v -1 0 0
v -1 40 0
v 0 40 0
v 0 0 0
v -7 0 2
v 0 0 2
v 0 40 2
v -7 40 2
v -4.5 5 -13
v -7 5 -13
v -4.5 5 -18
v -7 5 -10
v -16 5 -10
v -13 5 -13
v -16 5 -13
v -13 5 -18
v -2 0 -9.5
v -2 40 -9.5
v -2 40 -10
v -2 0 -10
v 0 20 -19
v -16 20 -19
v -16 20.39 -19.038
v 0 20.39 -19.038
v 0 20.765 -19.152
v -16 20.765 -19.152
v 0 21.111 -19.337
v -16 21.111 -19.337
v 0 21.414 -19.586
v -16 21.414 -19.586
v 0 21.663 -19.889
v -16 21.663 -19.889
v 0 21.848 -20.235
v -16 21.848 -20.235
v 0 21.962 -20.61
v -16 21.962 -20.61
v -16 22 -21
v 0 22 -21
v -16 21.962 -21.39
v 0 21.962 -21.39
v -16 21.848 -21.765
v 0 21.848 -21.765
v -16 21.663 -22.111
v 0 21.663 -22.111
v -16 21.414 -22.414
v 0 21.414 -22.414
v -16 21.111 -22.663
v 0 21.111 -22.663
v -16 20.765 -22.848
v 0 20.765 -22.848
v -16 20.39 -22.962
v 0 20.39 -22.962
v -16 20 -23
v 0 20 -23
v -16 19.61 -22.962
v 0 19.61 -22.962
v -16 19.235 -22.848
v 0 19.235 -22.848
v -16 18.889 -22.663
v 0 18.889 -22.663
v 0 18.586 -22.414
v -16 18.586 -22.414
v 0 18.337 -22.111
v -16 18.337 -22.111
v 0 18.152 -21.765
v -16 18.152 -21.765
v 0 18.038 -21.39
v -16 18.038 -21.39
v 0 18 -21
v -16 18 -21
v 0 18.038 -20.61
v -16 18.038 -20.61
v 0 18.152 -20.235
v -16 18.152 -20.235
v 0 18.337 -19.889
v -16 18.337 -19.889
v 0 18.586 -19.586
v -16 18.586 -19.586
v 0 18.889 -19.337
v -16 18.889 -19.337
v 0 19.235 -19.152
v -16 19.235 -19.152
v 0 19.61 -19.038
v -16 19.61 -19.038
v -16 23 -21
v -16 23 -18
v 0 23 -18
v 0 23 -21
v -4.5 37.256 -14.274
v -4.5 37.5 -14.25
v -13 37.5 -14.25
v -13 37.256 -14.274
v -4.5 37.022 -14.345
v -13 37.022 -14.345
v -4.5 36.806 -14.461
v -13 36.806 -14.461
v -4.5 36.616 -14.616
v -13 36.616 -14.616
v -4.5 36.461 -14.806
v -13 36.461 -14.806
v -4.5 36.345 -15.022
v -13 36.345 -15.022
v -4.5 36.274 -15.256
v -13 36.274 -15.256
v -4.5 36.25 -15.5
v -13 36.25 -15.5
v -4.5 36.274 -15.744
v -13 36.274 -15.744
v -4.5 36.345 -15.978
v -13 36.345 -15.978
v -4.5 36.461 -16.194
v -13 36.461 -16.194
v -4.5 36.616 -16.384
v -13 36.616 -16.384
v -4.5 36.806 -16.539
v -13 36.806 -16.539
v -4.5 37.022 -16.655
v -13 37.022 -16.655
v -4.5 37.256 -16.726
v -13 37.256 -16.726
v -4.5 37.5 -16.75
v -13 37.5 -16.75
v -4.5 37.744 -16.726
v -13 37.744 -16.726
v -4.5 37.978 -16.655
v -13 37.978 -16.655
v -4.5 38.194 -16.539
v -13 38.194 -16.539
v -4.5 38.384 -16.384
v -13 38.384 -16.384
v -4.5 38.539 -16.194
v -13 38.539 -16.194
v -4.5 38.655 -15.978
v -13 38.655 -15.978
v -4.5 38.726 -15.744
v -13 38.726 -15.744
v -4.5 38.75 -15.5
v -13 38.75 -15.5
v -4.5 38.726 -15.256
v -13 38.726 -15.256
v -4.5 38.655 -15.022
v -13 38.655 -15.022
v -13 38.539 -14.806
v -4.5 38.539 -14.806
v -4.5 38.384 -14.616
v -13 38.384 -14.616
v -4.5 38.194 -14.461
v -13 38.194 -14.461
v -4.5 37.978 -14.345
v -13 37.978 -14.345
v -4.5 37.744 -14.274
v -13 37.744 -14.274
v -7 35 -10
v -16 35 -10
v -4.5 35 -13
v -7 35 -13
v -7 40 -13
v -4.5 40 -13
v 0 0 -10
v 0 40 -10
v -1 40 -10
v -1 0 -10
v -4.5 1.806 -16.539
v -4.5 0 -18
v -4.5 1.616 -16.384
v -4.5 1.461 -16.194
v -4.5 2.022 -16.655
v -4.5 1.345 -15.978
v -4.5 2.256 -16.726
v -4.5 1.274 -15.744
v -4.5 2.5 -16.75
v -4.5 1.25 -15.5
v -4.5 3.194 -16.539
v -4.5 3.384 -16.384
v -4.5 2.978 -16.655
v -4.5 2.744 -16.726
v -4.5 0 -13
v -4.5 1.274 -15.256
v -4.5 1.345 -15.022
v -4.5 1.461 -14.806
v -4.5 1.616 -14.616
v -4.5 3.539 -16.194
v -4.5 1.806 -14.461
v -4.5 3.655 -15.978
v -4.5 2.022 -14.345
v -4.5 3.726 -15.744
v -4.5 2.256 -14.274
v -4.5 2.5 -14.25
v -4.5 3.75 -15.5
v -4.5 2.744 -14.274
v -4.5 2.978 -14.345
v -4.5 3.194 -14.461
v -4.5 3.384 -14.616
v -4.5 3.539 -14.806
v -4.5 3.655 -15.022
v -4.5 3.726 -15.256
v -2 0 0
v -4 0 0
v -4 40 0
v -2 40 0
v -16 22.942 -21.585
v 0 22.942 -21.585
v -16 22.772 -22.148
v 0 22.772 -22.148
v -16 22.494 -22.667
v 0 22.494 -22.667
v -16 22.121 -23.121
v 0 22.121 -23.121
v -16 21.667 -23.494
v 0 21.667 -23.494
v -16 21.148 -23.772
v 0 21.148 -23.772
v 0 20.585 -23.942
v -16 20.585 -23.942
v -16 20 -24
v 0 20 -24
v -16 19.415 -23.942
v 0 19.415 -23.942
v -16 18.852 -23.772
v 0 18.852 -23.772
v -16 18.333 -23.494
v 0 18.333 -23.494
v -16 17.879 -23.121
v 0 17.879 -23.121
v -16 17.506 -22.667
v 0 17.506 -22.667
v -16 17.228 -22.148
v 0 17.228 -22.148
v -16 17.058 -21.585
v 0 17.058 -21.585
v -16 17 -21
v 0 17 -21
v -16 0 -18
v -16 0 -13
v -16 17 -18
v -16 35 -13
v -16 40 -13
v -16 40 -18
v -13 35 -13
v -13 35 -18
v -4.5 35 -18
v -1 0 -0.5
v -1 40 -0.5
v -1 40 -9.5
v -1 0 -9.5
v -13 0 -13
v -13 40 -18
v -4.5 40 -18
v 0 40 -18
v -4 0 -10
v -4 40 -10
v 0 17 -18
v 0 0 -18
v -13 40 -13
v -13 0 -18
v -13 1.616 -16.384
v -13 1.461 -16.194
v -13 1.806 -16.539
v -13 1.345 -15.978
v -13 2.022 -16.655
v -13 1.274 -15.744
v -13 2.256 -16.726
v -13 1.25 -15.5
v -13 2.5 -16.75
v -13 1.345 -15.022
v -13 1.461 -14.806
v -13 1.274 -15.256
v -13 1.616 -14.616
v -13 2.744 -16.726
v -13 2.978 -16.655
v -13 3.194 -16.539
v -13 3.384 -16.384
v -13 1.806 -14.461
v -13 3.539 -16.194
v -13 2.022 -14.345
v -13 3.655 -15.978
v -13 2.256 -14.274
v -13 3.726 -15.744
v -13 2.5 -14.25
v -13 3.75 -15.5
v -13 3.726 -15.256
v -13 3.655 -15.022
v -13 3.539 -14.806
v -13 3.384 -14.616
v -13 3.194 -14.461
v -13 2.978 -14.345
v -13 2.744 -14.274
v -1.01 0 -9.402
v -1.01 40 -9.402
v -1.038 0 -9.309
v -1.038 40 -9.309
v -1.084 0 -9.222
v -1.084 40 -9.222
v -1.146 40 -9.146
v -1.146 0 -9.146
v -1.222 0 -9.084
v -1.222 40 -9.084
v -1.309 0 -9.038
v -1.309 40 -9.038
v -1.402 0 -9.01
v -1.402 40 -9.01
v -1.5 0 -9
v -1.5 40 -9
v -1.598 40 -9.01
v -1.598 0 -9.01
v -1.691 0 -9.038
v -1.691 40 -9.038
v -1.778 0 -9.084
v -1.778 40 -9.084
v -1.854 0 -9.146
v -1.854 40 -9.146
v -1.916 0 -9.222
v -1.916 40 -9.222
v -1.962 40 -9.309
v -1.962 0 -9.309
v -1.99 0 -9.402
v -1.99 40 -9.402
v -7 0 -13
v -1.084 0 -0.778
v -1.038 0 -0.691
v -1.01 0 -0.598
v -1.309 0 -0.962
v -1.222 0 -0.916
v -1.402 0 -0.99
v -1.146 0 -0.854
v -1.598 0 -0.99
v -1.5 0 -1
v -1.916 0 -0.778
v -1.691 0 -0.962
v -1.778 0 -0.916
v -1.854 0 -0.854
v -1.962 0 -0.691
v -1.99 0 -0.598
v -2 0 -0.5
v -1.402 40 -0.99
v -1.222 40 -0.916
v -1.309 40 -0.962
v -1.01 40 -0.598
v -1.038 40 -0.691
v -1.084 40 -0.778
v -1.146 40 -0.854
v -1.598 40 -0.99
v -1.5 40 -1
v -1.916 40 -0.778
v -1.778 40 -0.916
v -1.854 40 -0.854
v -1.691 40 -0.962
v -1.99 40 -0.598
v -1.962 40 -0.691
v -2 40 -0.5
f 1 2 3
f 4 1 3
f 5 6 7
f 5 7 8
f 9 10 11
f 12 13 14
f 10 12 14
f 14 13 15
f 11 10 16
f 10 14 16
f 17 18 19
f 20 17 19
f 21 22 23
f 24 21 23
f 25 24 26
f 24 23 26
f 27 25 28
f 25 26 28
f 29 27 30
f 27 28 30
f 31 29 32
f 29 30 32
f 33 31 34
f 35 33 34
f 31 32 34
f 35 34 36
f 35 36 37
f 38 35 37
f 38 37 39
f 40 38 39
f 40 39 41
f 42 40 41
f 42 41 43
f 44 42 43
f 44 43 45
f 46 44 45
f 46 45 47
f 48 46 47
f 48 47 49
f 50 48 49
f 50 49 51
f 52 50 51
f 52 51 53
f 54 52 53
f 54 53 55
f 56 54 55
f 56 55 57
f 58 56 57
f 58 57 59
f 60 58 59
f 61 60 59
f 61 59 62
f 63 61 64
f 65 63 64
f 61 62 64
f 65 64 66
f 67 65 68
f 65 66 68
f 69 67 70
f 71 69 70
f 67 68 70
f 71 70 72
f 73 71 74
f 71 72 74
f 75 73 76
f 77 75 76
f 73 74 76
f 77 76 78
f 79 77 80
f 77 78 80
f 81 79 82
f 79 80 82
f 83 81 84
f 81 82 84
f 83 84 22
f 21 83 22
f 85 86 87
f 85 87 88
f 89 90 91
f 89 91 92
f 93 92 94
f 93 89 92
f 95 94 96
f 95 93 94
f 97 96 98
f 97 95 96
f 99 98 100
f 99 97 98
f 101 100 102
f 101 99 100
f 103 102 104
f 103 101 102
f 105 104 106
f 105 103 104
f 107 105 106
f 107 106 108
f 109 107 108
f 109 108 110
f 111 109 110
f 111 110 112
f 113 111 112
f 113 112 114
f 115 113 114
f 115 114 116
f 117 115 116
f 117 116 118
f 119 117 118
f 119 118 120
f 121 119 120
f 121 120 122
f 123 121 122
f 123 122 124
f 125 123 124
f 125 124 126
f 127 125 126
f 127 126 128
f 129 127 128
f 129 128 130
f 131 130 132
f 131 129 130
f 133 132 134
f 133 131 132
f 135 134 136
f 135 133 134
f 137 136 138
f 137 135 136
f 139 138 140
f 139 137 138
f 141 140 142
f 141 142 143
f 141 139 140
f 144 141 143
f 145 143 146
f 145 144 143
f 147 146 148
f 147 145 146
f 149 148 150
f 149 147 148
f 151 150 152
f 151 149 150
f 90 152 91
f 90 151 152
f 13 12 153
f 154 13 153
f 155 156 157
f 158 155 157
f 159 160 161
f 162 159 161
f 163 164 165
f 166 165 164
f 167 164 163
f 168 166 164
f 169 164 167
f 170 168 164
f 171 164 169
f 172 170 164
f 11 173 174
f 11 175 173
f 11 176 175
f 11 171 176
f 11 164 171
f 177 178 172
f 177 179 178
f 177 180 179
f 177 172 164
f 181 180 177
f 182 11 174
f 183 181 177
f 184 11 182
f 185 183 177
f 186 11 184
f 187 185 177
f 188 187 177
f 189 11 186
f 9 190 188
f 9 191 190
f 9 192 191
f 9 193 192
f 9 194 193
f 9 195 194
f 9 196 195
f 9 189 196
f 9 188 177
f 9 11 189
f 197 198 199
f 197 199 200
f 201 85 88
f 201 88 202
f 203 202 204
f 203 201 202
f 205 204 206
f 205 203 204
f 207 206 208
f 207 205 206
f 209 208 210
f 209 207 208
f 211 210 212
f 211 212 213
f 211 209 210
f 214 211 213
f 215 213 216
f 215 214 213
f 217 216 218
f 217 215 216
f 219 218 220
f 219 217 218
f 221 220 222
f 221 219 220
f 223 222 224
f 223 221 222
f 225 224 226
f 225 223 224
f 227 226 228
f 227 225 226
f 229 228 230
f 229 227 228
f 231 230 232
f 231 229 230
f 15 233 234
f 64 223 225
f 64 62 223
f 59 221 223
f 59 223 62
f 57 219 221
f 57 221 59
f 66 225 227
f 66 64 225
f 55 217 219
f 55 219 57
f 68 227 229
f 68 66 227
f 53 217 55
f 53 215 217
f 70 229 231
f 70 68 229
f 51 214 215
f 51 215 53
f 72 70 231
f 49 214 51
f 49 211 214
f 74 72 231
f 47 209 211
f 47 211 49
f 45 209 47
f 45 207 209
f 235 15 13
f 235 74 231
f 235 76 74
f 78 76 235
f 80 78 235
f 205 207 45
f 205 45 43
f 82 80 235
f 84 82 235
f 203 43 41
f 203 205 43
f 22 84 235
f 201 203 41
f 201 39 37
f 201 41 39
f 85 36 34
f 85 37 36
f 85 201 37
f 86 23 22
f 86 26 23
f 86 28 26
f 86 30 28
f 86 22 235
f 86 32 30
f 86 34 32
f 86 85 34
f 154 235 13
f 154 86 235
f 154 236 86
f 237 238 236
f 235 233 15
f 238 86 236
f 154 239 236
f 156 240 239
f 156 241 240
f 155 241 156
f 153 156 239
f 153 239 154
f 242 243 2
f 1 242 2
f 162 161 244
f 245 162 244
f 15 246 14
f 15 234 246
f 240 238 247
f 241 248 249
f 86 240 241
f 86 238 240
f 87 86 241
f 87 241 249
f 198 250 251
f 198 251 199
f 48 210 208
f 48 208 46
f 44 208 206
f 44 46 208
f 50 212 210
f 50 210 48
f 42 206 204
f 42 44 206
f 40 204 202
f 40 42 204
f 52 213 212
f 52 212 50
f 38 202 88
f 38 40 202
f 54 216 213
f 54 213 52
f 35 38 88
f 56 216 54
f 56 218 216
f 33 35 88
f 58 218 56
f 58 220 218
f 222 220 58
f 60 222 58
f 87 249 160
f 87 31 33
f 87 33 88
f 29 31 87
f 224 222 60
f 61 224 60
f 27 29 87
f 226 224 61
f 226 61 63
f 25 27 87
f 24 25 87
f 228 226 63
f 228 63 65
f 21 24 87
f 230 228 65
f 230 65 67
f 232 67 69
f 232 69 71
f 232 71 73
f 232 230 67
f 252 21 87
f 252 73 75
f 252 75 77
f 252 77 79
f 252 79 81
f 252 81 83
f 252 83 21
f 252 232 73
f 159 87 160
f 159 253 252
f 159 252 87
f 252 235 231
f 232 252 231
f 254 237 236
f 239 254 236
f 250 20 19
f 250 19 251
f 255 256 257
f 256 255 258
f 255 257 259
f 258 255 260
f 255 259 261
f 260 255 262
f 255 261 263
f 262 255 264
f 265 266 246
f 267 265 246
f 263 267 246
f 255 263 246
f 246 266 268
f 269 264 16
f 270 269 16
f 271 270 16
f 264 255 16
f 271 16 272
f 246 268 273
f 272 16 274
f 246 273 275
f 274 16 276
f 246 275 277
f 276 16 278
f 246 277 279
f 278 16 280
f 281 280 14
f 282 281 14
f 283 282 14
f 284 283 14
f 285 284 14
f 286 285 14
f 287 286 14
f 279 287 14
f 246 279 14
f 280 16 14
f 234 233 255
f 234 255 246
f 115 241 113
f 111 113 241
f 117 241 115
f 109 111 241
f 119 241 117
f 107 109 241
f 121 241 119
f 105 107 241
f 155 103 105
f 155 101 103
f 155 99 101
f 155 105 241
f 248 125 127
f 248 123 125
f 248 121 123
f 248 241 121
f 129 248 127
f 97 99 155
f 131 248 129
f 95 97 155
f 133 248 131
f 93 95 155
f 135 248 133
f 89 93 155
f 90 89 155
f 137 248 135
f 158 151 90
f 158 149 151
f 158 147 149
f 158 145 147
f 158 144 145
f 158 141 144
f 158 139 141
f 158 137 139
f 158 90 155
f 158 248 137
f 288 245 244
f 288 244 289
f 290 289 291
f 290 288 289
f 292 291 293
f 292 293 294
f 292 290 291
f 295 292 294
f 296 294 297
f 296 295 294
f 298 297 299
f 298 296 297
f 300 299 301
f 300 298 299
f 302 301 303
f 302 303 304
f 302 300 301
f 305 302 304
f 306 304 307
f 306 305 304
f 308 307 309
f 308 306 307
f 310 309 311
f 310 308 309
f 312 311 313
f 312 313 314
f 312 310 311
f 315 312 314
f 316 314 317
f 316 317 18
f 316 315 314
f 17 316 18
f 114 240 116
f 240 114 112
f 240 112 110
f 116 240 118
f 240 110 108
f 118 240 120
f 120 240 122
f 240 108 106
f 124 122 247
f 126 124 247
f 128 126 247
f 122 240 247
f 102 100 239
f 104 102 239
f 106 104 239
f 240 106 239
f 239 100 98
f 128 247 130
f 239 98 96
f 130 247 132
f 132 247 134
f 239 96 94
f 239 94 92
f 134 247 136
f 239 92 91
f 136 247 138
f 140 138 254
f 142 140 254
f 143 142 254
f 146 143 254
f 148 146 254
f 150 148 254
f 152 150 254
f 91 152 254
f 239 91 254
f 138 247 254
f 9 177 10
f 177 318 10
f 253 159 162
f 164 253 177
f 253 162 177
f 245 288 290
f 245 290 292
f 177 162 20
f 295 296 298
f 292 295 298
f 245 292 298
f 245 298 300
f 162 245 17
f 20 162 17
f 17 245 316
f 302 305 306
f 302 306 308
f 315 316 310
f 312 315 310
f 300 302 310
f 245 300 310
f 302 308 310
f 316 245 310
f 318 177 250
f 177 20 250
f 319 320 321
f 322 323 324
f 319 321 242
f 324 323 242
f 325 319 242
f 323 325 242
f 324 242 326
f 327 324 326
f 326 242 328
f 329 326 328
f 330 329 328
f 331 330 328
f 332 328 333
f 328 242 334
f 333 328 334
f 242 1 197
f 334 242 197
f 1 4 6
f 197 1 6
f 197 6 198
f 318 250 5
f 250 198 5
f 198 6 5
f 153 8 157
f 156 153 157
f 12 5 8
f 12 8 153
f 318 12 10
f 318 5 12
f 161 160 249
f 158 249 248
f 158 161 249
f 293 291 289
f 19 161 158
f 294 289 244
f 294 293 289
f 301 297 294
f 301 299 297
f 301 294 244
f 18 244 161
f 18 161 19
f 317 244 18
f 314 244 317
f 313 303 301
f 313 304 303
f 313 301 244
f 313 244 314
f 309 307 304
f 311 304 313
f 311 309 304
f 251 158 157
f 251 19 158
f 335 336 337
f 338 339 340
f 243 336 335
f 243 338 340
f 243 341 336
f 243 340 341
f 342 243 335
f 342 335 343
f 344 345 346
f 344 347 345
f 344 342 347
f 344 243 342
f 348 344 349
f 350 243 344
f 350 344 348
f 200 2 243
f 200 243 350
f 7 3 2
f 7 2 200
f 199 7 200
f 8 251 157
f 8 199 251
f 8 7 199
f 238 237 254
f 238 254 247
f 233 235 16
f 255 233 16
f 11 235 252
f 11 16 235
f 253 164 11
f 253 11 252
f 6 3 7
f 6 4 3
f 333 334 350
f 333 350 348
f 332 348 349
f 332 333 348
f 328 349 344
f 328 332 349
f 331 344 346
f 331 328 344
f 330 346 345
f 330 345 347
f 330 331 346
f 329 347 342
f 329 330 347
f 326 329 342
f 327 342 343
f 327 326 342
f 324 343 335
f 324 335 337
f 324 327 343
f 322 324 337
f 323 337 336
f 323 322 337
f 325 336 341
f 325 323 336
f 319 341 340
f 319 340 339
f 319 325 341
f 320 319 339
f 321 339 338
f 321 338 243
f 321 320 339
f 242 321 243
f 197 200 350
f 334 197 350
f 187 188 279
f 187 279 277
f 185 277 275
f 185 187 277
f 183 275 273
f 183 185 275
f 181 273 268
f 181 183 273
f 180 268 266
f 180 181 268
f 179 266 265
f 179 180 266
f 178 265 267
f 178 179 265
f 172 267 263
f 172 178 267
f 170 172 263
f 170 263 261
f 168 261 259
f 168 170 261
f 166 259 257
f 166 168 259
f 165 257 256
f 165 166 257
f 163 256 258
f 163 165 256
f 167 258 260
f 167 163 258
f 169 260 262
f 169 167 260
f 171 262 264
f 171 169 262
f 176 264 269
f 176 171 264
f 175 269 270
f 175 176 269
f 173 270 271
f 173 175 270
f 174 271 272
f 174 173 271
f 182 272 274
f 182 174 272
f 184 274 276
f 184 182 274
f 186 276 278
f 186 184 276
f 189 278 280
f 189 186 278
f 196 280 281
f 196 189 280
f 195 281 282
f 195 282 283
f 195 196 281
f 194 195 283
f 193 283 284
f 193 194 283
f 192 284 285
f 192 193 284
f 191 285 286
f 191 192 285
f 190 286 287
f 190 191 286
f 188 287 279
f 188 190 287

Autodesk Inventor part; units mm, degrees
ref_plane "YZ Plane" through (0, 0, 0) normal (1, 0, 0) x (0, 1, 0)
ref_plane "XZ Plane" through (0, 0, 0) normal (0, 1, 0) x (-1, 0, 0)
ref_plane "XY Plane" through (0, 0, 0) normal (0, 0, 1) x (1, 0, 0)
sketch "Sketch1" plane through (0, 0, 0) normal (0, 1, 0) x (-1, 0, 0)
  line L0 (0, 0) -> (0, 2)
  line L1 (0, 2) -> (7, 2)
  line L2 (7, 2) -> (7, -18)
  line L3 (7, -18) -> (0, -18)
  line L4 (0, -18) -> (0, -10)
  line L5 (0, -10) -> (4, -10)
  line L6 (4, -10) -> (4, 0)
  line L7 (4, 0) -> (0, 0)
  dimension "d0" = 2
  dimension "d1" = 7
  dimension "d2" = 20
  dimension "d3" = 7
  dimension "d4" = 8
  dimension "d5" = 4
  dimension "d6" = 10
extrude "Extrusion1" add sketch "Sketch1" along normal blind 40
sketch "Sketch5" plane through (0, 0, 0) normal (0, -1, 0) x (1, 0, 0)
  line L0 (-1, -10) -> (-1, -9.5)
  line L1 (-1.5, -9) -> (-1.5, -9)
  line L2 (-2, -9.5) -> (-2, -10)
  line L3 (-2, -10) -> (-1, -10)
  line L4 (-1, -0.5) -> (-1, 0)
  line L5 (-1, 0) -> (-2, 0)
  line L6 (-2, 0) -> (-2, -0.5)
  line L7 (-1.5, -1) -> (-1.5, -1)
  arc A0 (-1.5, -9) -> (-2, -9.5) centre (-1.5, -9.5) ccw
  arc A1 (-1, -9.5) -> (-1.5, -9) centre (-1.5, -9.5) ccw
  arc A2 (-2, -0.5) -> (-1.5, -1) centre (-1.5, -0.5) ccw
  arc A3 (-1.5, -1) -> (-1, -0.5) centre (-1.5, -0.5) ccw
  point P0 (0, 0)
  point P1 (-1, -9)
  point P2 (-2, -9)
  point P3 (-1, -1)
  point P4 (-2, -1)
  point P5 (-1.5, 0)
  point P6 (-1.5, -10)
  point P7 (0, -10)
  dimension "d35" = 1
  dimension "d36" = 1
  dimension "d37" = 1
  dimension "d38" = 1
  dimension "d39" = 1
  dimension "d40" = 1
  dimension "d41" = 0.5
  dimension "d42" = 1
  dimension "d43" = 1
extrude "Extrusion2" add sketch "Sketch5" against normal blind 40
sketch "Sketch7" plane through (-7, 0, -18) normal (-1, 0, 0) x (0, 0, 1)
  line L0 (8, 0) -> (8, 5)
  line L1 (8, 0) -> (8, 40) projected
  line L2 (8, 5) -> (0, 5)
  line L3 (0, 0) -> (0, 40) projected
  line L4 (0, 35) -> (8, 35)
  line L5 (8, 40) -> (8, 0)
  line L6 (0, 0) -> (8, 0) projected
  point P0 (18, 0)
  dimension "d51" = 5
extrude "Extrusion4" add sketch "Sketch7" along normal blind 9
sketch "Sketch8" plane through (-16, 0, -18) normal (-1, 0, 0) x (0, 0, 1)
  line L0 (0, 40) -> (20, 40) projected
  line L1 (20, 0) -> (8, 0) projected
  line L2 (0, 40) -> (0, 23)
  line L3 (0, 0) -> (0, 40) projected
  line L4 (0, 23) -> (-3, 23)
  line L5 (0, 0) -> (0, 17)
  line L6 (0, 17) -> (-3, 17)
  arc A0 (-3, 23) -> (-3, 17) centre (-3, 20) ccw
  circle A1 centre (-3, 20) radius 2
  point P0 (18, 0)
  dimension "d56" = 40
  dimension "d57" = 17
  dimension "d58" = 3
  dimension "d59" = 17
  dimension "d60" = 3
  dimension "d61" = 4
extrude "Extrusion5" add sketch "Sketch8" against normal blind 16
sketch "Sketch10" plane through (-7, 0, -18) normal (-1, 0, 0) x (0, 0, 1)
  line L0 (0, 0) -> (5, 0)
  line L1 (5, 0) -> (5, 5)
  line L2 (5, 5) -> (0, 5)
  line L3 (0, 5) -> (0, 0)
  line L4 (0, 35) -> (5, 35)
  line L5 (5, 35) -> (5, 40)
  line L6 (5, 40) -> (0, 40)
  line L7 (0, 40) -> (0, 35)
  point P0 (18, 0)
  dimension "d64" = 5
  dimension "d65" = 5
  dimension "d66" = 5
  dimension "d67" = 5
extrude "Extrusion6" cut sketch "Sketch10" against normal blind 2.5
sketch "Sketch11" plane through (-16, 0, -18) normal (-1, 0, 0) x (0, 0, 1)
  line L0 (0, 0) -> (8, 0)
  line L1 (8, 0) -> (8, 5)
  line L2 (8, 5) -> (0, 5)
  line L3 (0, 5) -> (0, 0)
  point P0 (18, 0)
  dimension "d70" = 8
  dimension "d71" = 5
extrude "Extrusion7" cut sketch "Sketch11" against normal blind 9
sketch "Sketch12" plane through (-4.5, 0, -18) normal (-1, 0, 0) x (0, 0, 1)
  circle A0 centre (2.5, 2.5) radius 1.25
  circle A1 centre (2.5, 37.5) radius 1.25
  point P0 (18, 0)
  dimension "d74" = 2.5
  dimension "d75" = 2.5
extrude "Extrusion8" add sketch "Sketch12" along normal blind 11.5
sketch "Sketch14" plane through (-16, 0, -18) normal (-1, 0, 0) x (0, 0, 1)
  line L0 (0, 35) -> (5, 35)
  line L1 (5, 40) -> (5, 35) projected
  line L2 (5, 35) -> (5, 40)
  line L3 (5, 40) -> (0, 40)
  line L4 (8, 40) -> (0, 40) projected
  line L5 (0, 40) -> (0, 35)
  line L6 (0, 23) -> (0, 40) projected
  line L7 (0, 5) -> (0, 0)
  line L8 (0, 0) -> (5, 0)
  line L9 (5, 0) -> (5, 5)
  line L10 (0, 5) -> (8, 5) projected
  line L11 (5, 5) -> (0, 5)
  line L12 (0, 5) -> (5, 5) projected
  point P0 (18, 0)
extrude "Extrusion9" add sketch "Sketch14" against normal blind 3
sketch "Sketch4" plane through (-4, 0, 0) normal (1, 0, 0) x (0, 0, -1)
  point P0 (5, 30)
  point P1 (5, 10)
properties part number "Karetka"
